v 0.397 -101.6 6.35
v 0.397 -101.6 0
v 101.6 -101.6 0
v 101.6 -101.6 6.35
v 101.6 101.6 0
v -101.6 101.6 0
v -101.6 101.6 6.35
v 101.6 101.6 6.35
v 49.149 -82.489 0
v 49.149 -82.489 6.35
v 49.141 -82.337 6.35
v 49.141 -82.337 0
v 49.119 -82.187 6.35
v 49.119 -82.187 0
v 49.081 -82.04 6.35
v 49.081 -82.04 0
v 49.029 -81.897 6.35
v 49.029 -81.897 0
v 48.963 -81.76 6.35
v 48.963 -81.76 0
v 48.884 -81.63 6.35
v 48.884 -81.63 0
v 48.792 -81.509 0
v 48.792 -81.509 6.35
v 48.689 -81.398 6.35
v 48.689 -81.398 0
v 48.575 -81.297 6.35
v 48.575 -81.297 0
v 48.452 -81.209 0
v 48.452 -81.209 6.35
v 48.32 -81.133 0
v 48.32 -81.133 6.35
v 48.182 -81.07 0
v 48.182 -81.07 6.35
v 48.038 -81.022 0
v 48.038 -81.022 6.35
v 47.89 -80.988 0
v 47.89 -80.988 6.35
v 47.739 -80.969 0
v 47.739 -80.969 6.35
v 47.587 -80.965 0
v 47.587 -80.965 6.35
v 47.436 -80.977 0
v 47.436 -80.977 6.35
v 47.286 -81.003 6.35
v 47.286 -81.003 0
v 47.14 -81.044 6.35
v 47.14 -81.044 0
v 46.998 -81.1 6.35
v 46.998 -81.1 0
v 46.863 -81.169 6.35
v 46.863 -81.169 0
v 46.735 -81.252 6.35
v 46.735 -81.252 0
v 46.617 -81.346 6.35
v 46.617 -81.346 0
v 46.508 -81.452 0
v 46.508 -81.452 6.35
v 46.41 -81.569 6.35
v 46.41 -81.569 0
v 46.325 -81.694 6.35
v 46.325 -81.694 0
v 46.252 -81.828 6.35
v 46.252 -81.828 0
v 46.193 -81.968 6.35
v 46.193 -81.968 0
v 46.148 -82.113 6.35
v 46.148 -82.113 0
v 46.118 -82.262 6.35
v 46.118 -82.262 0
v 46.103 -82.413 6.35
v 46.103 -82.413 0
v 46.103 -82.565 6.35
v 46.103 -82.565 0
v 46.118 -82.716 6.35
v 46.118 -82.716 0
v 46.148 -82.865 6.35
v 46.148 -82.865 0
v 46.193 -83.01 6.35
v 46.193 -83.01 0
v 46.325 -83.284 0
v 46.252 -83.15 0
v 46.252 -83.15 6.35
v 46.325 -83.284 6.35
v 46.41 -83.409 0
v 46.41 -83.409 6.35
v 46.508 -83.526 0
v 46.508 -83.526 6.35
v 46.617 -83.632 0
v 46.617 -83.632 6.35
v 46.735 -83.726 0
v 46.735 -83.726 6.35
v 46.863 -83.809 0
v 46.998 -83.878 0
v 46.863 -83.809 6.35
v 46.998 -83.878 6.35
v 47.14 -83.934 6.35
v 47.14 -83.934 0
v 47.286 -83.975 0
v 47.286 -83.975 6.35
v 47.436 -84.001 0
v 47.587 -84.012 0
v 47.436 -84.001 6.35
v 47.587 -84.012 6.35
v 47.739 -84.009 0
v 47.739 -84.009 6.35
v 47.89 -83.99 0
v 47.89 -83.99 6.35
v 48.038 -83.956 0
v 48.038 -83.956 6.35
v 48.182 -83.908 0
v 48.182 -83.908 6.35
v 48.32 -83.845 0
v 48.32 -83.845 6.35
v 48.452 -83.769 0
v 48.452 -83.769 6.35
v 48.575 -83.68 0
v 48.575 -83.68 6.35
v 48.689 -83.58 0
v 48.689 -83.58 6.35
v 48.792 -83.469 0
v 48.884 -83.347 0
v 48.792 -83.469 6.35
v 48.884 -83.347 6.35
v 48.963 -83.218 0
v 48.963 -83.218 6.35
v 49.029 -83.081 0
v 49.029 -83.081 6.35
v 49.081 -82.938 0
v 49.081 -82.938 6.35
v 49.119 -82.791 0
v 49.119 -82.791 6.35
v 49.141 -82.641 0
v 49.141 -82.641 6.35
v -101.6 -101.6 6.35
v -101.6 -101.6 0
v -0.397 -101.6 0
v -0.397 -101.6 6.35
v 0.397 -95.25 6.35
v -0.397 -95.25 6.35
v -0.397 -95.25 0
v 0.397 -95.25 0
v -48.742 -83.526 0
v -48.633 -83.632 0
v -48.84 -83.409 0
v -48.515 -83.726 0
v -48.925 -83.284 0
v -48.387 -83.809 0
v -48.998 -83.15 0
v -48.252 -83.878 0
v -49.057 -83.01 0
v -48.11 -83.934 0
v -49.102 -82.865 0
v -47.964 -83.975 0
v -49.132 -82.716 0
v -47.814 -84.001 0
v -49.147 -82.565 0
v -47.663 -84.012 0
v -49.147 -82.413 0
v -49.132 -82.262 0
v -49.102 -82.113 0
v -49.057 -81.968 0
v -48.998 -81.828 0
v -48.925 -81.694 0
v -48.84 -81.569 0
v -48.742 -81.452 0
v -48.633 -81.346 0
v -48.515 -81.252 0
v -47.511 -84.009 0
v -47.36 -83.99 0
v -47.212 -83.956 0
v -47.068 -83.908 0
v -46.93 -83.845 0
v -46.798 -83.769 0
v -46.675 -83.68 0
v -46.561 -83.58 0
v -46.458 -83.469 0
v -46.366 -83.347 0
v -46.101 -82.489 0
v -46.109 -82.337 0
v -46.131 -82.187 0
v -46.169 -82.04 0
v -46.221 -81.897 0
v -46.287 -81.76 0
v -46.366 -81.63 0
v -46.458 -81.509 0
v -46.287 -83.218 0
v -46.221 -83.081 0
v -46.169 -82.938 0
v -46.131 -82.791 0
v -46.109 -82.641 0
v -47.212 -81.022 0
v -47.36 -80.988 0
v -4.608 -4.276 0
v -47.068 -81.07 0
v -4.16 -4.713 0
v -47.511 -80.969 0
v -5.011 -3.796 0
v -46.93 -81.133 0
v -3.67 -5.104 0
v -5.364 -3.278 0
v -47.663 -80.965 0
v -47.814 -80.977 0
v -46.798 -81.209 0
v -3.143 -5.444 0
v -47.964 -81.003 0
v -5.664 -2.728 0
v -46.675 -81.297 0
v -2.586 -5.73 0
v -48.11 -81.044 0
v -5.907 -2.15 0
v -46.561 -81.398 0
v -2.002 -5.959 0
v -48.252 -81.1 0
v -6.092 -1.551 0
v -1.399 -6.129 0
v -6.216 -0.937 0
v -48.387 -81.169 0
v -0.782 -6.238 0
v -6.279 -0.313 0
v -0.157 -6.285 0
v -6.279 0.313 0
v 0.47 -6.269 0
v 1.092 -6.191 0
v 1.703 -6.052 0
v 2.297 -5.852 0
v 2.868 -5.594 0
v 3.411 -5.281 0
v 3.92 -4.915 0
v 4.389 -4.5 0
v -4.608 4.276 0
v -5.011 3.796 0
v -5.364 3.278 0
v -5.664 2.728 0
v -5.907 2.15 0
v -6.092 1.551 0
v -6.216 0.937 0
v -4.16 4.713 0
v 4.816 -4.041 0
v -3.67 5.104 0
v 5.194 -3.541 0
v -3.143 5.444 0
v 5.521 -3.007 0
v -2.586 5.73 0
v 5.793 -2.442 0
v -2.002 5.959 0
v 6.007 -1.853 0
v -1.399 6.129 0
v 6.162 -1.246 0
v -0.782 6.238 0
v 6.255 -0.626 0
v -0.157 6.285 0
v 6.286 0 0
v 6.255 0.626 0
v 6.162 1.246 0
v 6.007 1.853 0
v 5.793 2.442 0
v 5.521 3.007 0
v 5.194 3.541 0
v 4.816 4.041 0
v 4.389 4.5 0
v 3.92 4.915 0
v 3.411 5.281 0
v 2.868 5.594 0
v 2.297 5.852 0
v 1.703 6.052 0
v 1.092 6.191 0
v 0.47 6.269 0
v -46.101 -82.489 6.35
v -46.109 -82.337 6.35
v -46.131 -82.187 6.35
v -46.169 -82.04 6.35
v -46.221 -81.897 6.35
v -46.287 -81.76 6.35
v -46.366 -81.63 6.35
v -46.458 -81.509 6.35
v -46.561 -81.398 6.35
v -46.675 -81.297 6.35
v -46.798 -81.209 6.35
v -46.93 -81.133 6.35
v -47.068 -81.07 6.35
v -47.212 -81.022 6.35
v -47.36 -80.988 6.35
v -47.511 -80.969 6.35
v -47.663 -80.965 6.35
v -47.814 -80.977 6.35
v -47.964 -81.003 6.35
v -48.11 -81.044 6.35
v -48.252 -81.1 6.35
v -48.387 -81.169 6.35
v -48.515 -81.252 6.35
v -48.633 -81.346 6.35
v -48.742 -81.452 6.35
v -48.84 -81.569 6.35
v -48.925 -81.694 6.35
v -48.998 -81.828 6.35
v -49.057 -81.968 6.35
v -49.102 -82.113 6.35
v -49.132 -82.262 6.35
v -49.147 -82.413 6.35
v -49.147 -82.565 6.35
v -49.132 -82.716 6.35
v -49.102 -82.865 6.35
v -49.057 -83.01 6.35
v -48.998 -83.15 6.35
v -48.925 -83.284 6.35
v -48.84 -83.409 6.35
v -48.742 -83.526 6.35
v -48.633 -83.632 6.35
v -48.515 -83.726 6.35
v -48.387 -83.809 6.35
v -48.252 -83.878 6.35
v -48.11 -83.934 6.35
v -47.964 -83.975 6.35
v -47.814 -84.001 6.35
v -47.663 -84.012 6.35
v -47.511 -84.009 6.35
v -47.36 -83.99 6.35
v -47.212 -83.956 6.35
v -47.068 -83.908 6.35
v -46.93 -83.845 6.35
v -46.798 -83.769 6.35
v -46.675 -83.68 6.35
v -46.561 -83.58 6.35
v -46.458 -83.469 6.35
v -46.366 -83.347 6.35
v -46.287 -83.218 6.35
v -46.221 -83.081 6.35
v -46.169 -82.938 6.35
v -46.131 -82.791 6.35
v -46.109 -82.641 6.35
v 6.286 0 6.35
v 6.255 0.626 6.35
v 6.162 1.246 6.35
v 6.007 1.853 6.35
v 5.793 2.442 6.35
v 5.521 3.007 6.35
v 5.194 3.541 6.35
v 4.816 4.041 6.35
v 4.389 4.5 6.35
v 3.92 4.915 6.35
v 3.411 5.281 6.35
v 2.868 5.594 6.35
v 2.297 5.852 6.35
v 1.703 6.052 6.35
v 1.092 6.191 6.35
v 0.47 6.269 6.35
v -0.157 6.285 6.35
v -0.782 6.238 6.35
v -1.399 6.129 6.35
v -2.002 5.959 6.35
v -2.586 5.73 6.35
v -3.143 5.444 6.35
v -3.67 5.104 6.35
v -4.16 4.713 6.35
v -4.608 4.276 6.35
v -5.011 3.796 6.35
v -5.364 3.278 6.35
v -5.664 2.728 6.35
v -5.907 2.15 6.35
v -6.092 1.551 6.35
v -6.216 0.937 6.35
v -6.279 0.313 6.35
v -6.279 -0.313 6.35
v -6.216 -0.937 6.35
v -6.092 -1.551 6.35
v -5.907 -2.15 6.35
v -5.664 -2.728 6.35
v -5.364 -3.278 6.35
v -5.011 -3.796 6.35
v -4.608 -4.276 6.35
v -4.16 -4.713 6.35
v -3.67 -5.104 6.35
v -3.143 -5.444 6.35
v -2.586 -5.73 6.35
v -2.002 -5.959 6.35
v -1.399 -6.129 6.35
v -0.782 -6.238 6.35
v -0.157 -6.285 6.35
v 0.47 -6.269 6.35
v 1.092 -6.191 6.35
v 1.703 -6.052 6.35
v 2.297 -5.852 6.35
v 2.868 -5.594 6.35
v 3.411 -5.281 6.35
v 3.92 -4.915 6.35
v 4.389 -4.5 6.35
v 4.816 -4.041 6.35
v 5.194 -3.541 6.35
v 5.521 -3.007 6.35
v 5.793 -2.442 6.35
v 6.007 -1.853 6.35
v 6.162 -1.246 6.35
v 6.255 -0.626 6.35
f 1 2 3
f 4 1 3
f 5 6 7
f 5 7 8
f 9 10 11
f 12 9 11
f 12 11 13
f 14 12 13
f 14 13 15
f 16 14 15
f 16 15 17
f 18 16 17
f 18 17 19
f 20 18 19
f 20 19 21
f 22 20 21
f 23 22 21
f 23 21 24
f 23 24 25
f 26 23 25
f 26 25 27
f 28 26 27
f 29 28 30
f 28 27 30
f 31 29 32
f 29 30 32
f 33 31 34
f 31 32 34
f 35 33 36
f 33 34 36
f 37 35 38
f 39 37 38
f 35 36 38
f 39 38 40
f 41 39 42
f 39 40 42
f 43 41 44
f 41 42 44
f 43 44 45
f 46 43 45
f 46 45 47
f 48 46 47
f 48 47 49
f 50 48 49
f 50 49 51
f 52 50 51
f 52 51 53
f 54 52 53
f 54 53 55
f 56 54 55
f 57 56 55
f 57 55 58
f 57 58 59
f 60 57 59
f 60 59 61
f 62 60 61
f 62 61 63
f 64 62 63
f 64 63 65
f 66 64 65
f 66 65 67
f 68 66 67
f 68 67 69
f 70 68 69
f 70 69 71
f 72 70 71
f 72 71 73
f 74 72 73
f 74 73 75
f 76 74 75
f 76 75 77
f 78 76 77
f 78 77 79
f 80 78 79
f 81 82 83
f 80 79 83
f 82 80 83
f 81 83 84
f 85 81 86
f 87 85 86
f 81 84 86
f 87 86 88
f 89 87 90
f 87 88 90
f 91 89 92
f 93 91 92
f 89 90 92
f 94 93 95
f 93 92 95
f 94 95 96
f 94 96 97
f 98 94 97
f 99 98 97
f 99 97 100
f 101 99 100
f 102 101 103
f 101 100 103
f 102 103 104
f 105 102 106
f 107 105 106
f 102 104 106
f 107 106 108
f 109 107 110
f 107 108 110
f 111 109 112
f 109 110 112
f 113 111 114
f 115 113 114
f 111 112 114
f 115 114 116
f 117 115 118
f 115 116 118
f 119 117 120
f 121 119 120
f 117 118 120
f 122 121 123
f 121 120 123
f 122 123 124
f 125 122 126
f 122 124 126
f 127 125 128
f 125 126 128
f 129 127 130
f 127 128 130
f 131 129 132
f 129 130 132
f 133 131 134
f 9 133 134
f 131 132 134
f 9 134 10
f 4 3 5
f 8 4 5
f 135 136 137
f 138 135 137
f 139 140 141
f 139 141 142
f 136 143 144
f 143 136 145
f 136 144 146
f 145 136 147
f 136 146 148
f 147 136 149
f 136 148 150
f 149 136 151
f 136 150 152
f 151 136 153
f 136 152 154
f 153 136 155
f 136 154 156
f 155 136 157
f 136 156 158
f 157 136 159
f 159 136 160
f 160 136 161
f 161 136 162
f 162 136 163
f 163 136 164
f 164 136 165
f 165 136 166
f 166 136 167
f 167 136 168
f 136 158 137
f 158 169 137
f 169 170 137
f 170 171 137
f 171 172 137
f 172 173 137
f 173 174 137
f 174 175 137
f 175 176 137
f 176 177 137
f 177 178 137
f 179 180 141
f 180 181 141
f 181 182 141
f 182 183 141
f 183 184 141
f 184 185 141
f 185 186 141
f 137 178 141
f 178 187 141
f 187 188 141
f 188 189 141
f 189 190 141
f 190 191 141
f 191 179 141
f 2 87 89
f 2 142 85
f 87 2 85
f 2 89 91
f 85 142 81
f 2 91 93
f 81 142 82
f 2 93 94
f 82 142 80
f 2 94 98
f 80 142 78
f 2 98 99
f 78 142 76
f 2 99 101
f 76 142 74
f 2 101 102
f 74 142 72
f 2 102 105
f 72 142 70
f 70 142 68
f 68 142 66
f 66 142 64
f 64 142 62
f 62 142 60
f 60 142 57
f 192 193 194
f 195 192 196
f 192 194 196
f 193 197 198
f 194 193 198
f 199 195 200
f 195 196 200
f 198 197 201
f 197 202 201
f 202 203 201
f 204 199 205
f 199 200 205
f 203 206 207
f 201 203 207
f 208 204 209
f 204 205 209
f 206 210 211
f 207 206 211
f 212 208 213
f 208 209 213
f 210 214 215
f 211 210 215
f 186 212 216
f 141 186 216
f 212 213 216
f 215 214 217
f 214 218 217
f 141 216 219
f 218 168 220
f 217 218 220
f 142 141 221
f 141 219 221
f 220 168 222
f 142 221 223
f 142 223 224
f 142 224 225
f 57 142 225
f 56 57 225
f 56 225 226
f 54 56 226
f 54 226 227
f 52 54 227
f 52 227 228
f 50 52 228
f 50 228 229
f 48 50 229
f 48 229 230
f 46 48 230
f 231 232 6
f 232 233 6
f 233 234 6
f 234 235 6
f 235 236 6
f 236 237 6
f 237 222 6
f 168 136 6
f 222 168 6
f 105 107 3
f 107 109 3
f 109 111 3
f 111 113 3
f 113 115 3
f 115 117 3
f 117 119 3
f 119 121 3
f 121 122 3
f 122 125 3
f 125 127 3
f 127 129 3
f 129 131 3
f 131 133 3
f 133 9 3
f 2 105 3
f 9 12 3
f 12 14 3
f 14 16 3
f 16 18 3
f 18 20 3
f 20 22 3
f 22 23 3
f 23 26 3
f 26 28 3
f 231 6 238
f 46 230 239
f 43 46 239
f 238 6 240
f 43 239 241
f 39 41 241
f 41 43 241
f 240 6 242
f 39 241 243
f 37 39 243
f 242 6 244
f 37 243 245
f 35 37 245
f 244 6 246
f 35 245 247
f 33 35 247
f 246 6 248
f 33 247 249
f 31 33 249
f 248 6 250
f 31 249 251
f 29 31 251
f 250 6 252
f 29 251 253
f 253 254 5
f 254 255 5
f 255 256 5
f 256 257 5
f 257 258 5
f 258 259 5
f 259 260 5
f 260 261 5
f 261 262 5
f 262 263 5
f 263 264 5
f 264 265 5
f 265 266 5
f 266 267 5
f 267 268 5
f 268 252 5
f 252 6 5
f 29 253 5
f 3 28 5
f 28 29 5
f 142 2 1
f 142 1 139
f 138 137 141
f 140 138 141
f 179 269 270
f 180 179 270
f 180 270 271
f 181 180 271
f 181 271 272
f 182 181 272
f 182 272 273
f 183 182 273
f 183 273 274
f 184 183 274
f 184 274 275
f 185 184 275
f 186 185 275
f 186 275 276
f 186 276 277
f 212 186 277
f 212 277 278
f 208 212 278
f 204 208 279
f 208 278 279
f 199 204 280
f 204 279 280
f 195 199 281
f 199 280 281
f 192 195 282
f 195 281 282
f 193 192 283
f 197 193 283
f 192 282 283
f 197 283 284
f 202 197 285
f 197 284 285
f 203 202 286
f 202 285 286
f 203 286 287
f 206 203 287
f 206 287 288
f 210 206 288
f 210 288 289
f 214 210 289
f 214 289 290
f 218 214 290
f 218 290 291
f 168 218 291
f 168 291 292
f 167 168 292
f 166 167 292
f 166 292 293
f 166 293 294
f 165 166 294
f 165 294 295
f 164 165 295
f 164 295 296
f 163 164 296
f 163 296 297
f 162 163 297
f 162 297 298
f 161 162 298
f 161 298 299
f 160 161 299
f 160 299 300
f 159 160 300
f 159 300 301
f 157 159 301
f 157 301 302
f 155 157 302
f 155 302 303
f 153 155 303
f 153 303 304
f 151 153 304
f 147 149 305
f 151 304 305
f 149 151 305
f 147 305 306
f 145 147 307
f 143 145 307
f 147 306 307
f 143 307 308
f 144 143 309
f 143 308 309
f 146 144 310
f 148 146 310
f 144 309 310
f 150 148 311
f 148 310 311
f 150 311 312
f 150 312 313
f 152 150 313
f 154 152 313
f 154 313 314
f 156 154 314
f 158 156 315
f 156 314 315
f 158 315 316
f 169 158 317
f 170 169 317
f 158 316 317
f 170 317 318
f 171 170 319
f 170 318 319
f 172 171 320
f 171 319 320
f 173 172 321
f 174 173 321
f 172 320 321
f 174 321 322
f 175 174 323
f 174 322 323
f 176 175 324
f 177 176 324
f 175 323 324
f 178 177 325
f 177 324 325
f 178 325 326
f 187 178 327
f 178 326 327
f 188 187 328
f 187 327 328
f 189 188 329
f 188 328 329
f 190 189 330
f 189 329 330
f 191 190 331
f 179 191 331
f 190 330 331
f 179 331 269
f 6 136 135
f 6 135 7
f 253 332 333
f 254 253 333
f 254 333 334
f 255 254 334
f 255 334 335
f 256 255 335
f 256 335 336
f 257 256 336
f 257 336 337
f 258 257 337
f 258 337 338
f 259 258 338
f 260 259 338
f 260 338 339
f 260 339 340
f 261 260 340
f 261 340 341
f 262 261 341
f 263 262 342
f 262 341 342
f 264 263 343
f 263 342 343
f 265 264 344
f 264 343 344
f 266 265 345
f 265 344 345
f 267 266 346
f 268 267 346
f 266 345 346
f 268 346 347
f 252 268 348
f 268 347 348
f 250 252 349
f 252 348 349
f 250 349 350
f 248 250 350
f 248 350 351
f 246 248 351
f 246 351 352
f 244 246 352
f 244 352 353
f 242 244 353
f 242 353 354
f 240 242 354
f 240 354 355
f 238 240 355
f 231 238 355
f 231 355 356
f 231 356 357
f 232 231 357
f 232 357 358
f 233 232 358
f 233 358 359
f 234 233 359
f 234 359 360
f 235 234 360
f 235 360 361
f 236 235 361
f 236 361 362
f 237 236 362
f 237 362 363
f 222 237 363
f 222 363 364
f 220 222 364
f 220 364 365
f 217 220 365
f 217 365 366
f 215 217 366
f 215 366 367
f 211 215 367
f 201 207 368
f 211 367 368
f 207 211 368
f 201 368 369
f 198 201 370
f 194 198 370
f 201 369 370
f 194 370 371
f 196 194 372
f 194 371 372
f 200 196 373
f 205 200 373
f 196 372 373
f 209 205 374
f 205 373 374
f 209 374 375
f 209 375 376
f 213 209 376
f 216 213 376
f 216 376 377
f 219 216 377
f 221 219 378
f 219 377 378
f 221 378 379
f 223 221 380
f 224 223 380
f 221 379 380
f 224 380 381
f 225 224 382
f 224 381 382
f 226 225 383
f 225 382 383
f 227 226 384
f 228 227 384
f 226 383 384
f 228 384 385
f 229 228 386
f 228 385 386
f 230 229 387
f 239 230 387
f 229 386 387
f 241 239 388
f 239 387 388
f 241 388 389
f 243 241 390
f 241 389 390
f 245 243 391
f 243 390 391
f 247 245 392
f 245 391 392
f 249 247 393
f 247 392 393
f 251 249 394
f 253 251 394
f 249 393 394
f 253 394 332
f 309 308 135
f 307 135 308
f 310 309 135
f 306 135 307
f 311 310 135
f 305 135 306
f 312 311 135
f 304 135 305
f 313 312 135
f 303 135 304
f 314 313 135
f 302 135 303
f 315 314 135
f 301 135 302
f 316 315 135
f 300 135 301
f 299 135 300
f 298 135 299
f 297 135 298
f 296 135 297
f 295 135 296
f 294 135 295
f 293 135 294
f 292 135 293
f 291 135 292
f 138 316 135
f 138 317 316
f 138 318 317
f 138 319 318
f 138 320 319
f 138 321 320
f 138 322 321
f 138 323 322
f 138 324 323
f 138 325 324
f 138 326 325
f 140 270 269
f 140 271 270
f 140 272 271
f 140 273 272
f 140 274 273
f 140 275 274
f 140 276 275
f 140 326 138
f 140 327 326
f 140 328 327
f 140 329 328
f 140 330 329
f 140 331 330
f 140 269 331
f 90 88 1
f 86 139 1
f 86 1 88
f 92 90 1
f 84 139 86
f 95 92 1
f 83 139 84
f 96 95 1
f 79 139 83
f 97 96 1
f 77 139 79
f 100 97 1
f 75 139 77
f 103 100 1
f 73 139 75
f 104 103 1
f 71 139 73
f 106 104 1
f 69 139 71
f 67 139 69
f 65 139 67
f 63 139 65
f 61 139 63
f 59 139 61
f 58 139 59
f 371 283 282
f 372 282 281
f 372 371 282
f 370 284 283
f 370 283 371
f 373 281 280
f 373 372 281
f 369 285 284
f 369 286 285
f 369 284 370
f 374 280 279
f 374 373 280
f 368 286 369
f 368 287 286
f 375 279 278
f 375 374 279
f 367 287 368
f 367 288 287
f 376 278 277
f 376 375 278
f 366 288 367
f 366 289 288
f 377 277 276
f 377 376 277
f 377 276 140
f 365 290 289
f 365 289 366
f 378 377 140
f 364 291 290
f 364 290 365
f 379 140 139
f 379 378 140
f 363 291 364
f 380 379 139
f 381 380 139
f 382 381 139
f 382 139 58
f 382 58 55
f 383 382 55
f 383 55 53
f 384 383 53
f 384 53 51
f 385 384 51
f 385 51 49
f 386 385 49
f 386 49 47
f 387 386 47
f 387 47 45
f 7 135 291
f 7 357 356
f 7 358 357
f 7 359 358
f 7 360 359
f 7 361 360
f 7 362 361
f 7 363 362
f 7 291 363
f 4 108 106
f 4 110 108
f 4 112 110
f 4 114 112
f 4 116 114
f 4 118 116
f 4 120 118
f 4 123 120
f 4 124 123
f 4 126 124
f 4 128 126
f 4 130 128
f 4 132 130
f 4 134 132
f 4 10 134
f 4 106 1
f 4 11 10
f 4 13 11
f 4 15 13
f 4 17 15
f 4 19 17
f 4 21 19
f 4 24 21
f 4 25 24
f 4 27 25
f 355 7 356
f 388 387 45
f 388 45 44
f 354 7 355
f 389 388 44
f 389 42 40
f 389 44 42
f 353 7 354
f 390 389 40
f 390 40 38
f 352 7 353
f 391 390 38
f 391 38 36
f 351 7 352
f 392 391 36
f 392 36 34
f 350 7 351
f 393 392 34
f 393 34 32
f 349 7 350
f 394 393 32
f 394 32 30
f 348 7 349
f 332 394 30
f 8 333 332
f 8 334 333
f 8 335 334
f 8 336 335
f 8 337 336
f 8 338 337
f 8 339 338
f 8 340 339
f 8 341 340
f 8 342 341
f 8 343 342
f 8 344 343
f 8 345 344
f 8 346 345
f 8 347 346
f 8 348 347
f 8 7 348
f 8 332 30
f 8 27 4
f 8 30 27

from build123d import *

# Parameters (mm, degrees)
SKETCH1_W      = 203.2
SKETCH1_H      = 203.2
EXTRUDE1_DEPTH = 6.35
SKETCH2_R      = 6.2865
EXTRUDE2_DEPTH = 144.824345992
SKETCH3_R      = 1.524
EXTRUDE3_DEPTH = 144.824345992
SKETCH4_W      = 0.79375
SKETCH4_H      = 6.35
EXTRUDE4_DEPTH = 6.35


with BuildPart() as part:
    # Sketch1 → Extrude1 (new body)
    with BuildSketch(Plane.XY):
        Rectangle(SKETCH1_W, SKETCH1_H)
    extrude(amount=EXTRUDE1_DEPTH)

    # Sketch2 → Extrude2 (cut, through all)
    with BuildSketch(Plane.XY.offset(6.35)):
        Circle(SKETCH2_R)
    extrude(amount=-EXTRUDE2_DEPTH, mode=Mode.SUBTRACT)

    # Sketch3 → Extrude3 (cut, through all)
    with BuildSketch(Plane.XY.offset(6.35)):
        with Locations((-47.625, -82.48891971)):
            Circle(SKETCH3_R)
        with Locations((47.625, -82.48891971)):
            Circle(SKETCH3_R)
    extrude(amount=-EXTRUDE3_DEPTH, mode=Mode.SUBTRACT)

    # Sketch4 → Extrude4 (cut)
    with BuildSketch(Plane.XY.offset(6.35)):
        with Locations((0, -98.425)):
            Rectangle(SKETCH4_W, SKETCH4_H)
    extrude(amount=-EXTRUDE4_DEPTH, mode=Mode.SUBTRACT)


solid = part.part
